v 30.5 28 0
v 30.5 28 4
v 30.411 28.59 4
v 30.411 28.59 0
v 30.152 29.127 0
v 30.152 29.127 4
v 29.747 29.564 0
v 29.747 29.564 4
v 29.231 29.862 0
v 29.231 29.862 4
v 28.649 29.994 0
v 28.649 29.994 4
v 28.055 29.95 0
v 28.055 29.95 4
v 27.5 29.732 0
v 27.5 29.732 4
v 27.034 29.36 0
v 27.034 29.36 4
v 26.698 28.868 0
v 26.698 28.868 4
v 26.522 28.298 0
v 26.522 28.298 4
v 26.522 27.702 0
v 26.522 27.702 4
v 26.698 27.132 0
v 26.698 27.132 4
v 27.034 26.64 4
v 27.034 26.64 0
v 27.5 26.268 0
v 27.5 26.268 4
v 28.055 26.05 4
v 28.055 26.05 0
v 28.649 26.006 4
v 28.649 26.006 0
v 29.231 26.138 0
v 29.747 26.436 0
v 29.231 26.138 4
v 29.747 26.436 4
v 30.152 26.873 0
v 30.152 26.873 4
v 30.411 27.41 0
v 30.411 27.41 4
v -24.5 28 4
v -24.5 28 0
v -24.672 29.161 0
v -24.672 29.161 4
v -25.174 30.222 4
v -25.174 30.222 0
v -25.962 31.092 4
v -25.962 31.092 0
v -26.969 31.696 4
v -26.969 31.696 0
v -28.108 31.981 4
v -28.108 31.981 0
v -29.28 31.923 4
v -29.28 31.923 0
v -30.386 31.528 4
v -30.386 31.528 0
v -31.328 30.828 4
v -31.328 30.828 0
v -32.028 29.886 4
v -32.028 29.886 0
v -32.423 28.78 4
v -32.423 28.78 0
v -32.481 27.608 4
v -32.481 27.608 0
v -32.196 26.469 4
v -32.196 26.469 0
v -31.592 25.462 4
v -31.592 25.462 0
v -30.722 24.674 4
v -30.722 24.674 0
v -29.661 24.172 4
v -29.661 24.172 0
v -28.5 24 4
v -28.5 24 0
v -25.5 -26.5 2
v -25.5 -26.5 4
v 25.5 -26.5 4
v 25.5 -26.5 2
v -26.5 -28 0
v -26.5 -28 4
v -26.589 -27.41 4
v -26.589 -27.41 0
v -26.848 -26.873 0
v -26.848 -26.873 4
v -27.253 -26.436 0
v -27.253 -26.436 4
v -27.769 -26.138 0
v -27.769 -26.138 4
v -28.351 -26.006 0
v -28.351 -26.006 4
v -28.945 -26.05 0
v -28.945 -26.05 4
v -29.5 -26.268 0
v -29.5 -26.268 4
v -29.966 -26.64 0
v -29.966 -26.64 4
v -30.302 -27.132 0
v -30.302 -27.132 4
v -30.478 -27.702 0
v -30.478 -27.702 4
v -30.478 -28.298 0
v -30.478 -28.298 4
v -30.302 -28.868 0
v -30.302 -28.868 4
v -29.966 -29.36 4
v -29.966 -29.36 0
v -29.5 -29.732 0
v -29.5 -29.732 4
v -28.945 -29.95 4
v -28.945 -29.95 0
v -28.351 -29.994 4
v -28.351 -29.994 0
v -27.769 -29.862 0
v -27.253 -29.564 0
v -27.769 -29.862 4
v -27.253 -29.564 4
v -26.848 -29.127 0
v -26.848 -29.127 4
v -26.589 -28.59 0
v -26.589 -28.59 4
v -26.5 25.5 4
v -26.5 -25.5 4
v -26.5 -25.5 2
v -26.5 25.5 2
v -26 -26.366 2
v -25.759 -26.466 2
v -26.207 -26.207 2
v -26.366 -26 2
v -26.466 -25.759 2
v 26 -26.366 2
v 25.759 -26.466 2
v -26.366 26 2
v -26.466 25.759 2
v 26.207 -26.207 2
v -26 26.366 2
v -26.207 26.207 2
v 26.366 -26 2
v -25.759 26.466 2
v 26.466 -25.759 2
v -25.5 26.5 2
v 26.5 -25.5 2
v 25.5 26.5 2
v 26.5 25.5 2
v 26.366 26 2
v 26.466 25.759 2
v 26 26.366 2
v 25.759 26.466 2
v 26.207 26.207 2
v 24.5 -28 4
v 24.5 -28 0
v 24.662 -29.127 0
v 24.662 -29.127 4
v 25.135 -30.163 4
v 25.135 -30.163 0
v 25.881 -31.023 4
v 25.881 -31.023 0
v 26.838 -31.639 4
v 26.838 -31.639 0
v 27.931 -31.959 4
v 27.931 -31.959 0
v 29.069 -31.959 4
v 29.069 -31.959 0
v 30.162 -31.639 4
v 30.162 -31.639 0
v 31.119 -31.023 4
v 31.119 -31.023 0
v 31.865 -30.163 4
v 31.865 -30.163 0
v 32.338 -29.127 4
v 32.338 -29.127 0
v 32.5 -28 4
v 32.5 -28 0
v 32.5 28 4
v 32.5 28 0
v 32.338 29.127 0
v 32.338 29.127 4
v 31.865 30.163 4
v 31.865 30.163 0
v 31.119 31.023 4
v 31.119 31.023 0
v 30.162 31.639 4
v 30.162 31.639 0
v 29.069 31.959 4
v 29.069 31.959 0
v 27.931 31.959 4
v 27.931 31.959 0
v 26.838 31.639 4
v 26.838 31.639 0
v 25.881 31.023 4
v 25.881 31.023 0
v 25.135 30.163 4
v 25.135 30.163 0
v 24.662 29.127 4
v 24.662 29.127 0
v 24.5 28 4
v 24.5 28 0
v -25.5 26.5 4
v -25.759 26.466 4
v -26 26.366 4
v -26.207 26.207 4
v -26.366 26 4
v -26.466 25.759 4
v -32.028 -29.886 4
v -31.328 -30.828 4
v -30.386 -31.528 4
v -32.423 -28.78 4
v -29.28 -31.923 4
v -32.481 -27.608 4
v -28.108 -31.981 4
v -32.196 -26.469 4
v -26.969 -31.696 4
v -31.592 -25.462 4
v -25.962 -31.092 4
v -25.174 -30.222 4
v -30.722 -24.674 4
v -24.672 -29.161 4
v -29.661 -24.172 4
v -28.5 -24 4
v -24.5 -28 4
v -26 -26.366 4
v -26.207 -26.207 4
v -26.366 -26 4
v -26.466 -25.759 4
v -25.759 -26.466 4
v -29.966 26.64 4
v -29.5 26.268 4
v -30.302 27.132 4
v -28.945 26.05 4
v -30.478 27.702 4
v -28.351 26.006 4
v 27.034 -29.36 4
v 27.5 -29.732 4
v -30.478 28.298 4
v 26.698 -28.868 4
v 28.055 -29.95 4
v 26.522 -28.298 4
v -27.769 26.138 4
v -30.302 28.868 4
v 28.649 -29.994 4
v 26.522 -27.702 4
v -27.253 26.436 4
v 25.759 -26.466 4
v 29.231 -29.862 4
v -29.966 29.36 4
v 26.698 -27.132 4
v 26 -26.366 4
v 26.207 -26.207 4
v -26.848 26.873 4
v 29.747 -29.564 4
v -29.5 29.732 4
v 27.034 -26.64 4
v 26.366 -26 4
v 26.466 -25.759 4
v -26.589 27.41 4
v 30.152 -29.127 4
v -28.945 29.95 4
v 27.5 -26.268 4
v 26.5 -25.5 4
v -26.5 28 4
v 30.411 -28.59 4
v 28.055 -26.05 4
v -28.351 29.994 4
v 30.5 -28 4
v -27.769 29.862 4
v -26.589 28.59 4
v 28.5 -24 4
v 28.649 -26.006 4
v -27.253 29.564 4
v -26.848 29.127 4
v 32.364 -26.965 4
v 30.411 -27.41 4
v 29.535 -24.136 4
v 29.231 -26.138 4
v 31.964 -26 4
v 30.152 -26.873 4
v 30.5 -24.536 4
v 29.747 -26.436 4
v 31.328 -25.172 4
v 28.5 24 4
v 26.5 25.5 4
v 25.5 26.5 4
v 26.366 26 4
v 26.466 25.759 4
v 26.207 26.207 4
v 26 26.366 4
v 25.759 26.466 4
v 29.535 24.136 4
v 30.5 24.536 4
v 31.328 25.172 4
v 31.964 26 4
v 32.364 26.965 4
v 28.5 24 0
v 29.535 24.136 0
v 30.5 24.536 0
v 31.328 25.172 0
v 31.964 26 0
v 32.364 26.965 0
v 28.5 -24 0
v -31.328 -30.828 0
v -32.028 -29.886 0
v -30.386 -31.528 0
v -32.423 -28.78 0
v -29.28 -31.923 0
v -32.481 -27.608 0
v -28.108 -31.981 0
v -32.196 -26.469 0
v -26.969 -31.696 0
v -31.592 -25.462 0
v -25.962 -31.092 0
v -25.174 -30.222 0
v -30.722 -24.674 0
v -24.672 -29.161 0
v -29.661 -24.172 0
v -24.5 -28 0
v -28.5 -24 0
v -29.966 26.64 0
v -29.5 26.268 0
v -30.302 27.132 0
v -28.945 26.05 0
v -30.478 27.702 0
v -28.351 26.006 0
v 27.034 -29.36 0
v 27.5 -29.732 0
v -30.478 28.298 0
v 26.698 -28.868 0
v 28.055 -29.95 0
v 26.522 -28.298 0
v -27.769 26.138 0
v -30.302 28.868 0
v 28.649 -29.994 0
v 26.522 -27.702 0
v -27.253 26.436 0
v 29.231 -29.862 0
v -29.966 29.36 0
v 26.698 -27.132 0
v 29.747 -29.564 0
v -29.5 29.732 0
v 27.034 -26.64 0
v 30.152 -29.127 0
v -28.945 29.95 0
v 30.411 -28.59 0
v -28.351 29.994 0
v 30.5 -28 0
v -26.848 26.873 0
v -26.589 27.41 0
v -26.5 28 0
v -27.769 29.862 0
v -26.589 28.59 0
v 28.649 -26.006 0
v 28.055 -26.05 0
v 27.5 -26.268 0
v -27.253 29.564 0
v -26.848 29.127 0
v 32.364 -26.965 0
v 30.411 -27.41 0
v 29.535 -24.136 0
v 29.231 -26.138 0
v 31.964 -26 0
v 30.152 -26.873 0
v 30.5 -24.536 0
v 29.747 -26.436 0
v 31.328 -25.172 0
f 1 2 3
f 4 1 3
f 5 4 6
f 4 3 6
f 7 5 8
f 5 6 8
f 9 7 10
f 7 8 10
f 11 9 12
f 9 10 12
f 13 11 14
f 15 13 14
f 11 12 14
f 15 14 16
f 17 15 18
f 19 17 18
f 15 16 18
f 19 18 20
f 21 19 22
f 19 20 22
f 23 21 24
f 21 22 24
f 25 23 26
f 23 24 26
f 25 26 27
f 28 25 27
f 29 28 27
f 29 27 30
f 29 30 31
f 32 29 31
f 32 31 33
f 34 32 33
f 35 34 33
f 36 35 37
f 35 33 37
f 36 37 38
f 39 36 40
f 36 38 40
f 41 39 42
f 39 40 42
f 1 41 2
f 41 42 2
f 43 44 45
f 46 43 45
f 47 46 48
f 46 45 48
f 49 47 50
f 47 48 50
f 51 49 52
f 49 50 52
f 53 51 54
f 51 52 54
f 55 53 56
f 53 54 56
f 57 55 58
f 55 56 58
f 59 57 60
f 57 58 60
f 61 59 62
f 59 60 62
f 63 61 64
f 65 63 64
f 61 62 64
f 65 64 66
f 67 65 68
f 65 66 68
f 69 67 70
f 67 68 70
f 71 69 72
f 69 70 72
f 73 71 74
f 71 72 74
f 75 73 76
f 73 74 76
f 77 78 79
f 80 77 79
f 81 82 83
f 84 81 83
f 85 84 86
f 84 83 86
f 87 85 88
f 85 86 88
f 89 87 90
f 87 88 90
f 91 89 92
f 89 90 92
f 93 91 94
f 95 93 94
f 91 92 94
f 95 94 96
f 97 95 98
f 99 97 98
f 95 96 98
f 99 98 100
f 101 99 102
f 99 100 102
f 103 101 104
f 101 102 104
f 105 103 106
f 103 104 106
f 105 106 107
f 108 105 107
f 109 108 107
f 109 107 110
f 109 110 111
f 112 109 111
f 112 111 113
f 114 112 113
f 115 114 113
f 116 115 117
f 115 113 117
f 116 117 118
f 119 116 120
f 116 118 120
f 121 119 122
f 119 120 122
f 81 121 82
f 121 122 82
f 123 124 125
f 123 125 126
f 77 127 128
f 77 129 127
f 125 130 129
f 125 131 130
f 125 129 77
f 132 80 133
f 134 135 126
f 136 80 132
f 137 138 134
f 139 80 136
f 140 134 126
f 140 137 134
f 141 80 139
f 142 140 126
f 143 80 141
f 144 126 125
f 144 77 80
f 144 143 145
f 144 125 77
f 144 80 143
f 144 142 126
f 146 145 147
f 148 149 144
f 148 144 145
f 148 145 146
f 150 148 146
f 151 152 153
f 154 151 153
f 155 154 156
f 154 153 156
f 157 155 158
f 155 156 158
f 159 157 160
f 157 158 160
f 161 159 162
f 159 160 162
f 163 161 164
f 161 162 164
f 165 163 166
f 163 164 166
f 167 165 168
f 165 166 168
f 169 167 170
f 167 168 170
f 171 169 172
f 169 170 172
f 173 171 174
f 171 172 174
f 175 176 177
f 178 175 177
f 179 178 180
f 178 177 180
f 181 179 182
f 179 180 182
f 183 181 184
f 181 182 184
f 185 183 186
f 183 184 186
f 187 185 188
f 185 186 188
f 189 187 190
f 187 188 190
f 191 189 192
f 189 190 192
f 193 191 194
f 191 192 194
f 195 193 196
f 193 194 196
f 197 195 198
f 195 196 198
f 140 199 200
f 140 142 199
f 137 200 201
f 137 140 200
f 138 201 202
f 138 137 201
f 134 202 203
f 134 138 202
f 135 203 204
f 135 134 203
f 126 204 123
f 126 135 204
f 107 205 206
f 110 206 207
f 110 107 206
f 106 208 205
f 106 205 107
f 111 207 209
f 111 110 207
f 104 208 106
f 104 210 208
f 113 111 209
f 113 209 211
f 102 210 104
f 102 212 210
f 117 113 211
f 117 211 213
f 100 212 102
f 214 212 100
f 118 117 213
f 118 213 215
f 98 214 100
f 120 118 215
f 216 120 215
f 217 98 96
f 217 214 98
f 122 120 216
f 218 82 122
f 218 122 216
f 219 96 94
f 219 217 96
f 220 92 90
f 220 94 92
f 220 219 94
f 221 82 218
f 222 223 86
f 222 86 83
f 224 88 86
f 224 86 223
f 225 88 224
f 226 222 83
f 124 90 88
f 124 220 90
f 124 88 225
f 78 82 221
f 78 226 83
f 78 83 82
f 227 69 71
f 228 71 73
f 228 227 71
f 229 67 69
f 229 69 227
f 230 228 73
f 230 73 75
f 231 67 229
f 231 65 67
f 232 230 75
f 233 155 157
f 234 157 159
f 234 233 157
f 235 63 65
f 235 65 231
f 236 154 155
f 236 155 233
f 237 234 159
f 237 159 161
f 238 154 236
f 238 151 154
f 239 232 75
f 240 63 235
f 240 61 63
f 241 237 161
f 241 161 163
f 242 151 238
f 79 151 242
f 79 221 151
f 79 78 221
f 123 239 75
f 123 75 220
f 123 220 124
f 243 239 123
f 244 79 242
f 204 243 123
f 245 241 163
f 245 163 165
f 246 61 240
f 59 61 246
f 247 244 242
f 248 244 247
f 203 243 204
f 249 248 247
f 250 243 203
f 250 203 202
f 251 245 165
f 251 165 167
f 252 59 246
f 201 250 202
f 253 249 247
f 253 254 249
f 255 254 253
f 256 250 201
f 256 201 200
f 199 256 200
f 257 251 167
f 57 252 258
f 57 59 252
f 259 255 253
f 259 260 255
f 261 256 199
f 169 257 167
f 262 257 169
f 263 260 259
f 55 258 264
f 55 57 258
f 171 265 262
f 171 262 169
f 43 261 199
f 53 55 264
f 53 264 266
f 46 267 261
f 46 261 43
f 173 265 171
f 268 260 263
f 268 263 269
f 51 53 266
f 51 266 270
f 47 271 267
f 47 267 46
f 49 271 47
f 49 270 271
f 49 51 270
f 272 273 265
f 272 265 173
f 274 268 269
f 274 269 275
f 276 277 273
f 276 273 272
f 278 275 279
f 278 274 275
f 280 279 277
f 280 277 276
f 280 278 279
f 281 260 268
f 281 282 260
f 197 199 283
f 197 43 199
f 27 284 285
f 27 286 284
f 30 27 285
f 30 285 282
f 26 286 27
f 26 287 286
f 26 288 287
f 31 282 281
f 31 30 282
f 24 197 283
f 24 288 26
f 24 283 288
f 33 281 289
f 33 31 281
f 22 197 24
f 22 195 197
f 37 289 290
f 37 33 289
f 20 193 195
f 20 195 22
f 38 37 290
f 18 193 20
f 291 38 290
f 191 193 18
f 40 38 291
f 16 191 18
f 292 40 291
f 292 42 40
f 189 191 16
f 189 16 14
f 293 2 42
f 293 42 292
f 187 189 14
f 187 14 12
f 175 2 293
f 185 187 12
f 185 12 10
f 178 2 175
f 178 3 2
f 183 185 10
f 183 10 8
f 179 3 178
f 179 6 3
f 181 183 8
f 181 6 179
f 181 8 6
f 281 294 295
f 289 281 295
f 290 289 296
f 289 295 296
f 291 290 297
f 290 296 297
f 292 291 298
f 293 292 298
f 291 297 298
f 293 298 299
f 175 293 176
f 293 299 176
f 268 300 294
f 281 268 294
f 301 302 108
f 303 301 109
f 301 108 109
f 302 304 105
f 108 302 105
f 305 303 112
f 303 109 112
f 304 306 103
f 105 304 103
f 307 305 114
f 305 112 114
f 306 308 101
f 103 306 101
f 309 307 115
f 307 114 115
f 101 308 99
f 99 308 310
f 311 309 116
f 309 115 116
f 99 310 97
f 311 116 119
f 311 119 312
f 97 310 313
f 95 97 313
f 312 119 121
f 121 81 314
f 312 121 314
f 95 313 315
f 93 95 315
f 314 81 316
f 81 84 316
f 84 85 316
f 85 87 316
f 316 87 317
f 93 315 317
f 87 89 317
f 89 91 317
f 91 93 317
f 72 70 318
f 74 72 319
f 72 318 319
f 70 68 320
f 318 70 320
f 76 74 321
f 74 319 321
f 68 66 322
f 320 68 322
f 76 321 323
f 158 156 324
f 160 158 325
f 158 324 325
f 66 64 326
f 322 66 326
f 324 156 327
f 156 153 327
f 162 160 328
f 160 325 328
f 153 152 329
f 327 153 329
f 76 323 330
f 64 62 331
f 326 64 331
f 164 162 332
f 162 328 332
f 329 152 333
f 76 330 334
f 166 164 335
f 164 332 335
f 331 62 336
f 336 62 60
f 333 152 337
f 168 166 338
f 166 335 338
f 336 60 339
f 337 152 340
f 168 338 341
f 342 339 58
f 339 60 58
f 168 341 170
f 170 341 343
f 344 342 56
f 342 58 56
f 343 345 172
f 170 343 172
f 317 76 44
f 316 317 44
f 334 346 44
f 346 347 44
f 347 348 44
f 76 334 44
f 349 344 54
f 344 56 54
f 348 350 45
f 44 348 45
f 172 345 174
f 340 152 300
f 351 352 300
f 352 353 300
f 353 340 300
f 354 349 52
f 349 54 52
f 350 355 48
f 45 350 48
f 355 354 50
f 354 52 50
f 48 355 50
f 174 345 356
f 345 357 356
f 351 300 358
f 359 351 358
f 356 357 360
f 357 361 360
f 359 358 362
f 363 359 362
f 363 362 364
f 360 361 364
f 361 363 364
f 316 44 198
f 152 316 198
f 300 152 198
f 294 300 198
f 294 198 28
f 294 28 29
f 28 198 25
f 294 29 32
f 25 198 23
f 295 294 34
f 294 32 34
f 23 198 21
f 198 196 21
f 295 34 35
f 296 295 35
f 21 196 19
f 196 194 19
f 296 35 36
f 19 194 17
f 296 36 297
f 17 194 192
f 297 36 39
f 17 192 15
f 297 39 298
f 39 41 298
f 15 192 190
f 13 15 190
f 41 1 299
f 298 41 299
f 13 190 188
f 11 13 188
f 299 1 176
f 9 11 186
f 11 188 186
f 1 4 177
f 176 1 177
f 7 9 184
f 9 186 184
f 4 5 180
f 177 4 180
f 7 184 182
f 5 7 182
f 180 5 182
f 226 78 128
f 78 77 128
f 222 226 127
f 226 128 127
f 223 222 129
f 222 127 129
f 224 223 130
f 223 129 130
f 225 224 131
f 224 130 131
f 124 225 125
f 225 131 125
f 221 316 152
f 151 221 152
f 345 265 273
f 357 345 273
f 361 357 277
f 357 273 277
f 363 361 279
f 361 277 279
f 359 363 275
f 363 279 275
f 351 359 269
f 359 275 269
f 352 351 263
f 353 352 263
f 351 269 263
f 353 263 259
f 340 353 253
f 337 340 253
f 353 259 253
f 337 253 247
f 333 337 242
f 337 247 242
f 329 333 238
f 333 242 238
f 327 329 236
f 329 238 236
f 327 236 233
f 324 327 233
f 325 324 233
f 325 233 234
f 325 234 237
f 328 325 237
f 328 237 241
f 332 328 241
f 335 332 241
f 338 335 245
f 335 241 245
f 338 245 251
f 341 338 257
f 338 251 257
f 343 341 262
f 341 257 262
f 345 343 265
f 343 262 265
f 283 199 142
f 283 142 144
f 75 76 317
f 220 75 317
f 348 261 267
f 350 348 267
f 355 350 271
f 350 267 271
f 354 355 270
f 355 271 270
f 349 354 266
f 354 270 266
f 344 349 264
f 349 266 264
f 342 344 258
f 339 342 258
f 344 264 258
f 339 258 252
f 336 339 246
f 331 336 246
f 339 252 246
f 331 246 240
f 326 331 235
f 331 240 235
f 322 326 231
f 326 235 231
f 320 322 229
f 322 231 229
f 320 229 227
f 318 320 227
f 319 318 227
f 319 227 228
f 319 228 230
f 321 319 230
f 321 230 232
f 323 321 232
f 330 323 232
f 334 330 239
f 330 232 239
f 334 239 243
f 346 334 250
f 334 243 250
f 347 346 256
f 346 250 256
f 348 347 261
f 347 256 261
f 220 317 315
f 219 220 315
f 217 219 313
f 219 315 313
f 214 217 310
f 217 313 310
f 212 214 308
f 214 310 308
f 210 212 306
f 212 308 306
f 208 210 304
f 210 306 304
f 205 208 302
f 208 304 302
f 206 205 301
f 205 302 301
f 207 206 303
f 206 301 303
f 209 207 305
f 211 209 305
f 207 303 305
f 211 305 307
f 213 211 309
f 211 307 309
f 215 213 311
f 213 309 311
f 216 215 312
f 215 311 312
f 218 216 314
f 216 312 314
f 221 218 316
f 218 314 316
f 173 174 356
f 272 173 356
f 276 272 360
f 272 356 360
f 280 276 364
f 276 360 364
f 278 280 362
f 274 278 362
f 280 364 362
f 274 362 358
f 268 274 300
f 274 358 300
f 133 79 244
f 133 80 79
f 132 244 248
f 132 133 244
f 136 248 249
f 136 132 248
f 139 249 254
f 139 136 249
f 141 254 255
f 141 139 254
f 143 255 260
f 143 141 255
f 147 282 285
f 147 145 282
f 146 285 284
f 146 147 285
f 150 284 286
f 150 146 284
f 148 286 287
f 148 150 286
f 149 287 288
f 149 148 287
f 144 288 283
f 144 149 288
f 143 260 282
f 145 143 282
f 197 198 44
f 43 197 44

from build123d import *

# Parameters (mm, degrees)
F1_DEPTH = 4
F2_R     = 2
F3_DEPTH = 4
F4_W     = 53
F4_H     = 53
F5_DEPTH = 2
F6_R     = 1


with BuildPart() as f1:
    # F0 (on Top) → F1 (new body)
    with BuildSketch(Plane.XY):
        with BuildLine():
            ThreePointArc((-28.5, 24), (-25.6715728753, 25.1715728753), (-24.5, 28))
            Line((-24.5, 28), (-28.5, 28))
            Line((-28.5, 28), (-28.5, 24))
        make_face()
        with BuildLine():
            Line((-28.5, 28), (-24.5, 28))
            ThreePointArc((-24.5, 28), (-31.3284271247, 30.8284271247), (-28.5, 24))
            Line((-28.5, 24), (-28.5, 28))
        make_face()
        with BuildLine():
            Line((24.5, 28), (-24.5, 28))
            ThreePointArc((-24.5, 28), (-25.6715728753, 25.1715728753), (-28.5, 24))
            Line((-28.5, 24), (-28.5, -24))
            ThreePointArc((-28.5, -24), (-25.6715728753, -25.1715728753), (-24.5, -28))
            Line((-24.5, -28), (24.5, -28))
            ThreePointArc((24.5, -28), (25.6715728753, -25.1715728753), (28.5, -24))
            Line((28.5, -24), (28.5, 24))
            ThreePointArc((28.5, 24), (25.6715728753, 25.1715728753), (24.5, 28))
        make_face()
        with BuildLine():
            ThreePointArc((32.5, 28), (28.5, 32), (24.5, 28))
            Line((24.5, 28), (28.5, 28))
            Line((28.5, 28), (28.5, 24))
            ThreePointArc((28.5, 24), (31.3284271247, 25.1715728753), (32.5, 28))
        make_face()
        with BuildLine():
            Line((28.5, 28), (24.5, 28))
            ThreePointArc((24.5, 28), (25.6715728753, 25.1715728753), (28.5, 24))
            Line((28.5, 24), (28.5, 28))
        make_face()
        with BuildLine():
            ThreePointArc((-24.5, -28), (-25.6715728753, -25.1715728753), (-28.5, -24))
            Line((-28.5, -24), (-28.5, -28))
            Line((-28.5, -28), (-24.5, -28))
        make_face()
        with BuildLine():
            Line((-28.5, -28), (-28.5, -24))
            ThreePointArc((-28.5, -24), (-31.3284271247, -30.8284271247), (-24.5, -28))
            Line((-24.5, -28), (-28.5, -28))
        make_face()
        with BuildLine():
            ThreePointArc((32.5, -28), (31.3284271247, -25.1715728753), (28.5, -24))
            Line((28.5, -24), (28.5, -28))
            Line((28.5, -28), (24.5, -28))
            ThreePointArc((24.5, -28), (28.5, -32), (32.5, -28))
        make_face()
        with BuildLine():
            Line((28.5, -28), (28.5, -24))
            ThreePointArc((28.5, -24), (25.6715728753, -25.1715728753), (24.5, -28))
            Line((24.5, -28), (28.5, -28))
        make_face()
    extrude(amount=F1_DEPTH)

    # F2 (on face) → F3 (cut, through all)
    with BuildSketch(Plane.XY.offset(4)):
        with Locations((-28.5, 28)):
            Circle(F2_R)
        with Locations((28.5, 28)):
            Circle(F2_R)
        with Locations((28.5, -28)):
            Circle(F2_R)
        with Locations((-28.5, -28)):
            Circle(F2_R)
    extrude(amount=-F3_DEPTH, mode=Mode.SUBTRACT)

    # F4 (on face) → F5 (cut)
    with BuildSketch(Plane.XY.offset(4)):
        Rectangle(F4_W, F4_H)
    extrude(amount=-F5_DEPTH, mode=Mode.SUBTRACT)

    # F6
    f6_edges = [f1.edges().sort_by_distance(p)[0] for p in [
        (-26.5, 26.5, 3),
        (26.5, 26.5, 3),
        (26.5, -26.5, 3),
        (-26.5, -26.5, 3),
    ]]
    fillet(f6_edges, radius=F6_R)


solid = f1.part
